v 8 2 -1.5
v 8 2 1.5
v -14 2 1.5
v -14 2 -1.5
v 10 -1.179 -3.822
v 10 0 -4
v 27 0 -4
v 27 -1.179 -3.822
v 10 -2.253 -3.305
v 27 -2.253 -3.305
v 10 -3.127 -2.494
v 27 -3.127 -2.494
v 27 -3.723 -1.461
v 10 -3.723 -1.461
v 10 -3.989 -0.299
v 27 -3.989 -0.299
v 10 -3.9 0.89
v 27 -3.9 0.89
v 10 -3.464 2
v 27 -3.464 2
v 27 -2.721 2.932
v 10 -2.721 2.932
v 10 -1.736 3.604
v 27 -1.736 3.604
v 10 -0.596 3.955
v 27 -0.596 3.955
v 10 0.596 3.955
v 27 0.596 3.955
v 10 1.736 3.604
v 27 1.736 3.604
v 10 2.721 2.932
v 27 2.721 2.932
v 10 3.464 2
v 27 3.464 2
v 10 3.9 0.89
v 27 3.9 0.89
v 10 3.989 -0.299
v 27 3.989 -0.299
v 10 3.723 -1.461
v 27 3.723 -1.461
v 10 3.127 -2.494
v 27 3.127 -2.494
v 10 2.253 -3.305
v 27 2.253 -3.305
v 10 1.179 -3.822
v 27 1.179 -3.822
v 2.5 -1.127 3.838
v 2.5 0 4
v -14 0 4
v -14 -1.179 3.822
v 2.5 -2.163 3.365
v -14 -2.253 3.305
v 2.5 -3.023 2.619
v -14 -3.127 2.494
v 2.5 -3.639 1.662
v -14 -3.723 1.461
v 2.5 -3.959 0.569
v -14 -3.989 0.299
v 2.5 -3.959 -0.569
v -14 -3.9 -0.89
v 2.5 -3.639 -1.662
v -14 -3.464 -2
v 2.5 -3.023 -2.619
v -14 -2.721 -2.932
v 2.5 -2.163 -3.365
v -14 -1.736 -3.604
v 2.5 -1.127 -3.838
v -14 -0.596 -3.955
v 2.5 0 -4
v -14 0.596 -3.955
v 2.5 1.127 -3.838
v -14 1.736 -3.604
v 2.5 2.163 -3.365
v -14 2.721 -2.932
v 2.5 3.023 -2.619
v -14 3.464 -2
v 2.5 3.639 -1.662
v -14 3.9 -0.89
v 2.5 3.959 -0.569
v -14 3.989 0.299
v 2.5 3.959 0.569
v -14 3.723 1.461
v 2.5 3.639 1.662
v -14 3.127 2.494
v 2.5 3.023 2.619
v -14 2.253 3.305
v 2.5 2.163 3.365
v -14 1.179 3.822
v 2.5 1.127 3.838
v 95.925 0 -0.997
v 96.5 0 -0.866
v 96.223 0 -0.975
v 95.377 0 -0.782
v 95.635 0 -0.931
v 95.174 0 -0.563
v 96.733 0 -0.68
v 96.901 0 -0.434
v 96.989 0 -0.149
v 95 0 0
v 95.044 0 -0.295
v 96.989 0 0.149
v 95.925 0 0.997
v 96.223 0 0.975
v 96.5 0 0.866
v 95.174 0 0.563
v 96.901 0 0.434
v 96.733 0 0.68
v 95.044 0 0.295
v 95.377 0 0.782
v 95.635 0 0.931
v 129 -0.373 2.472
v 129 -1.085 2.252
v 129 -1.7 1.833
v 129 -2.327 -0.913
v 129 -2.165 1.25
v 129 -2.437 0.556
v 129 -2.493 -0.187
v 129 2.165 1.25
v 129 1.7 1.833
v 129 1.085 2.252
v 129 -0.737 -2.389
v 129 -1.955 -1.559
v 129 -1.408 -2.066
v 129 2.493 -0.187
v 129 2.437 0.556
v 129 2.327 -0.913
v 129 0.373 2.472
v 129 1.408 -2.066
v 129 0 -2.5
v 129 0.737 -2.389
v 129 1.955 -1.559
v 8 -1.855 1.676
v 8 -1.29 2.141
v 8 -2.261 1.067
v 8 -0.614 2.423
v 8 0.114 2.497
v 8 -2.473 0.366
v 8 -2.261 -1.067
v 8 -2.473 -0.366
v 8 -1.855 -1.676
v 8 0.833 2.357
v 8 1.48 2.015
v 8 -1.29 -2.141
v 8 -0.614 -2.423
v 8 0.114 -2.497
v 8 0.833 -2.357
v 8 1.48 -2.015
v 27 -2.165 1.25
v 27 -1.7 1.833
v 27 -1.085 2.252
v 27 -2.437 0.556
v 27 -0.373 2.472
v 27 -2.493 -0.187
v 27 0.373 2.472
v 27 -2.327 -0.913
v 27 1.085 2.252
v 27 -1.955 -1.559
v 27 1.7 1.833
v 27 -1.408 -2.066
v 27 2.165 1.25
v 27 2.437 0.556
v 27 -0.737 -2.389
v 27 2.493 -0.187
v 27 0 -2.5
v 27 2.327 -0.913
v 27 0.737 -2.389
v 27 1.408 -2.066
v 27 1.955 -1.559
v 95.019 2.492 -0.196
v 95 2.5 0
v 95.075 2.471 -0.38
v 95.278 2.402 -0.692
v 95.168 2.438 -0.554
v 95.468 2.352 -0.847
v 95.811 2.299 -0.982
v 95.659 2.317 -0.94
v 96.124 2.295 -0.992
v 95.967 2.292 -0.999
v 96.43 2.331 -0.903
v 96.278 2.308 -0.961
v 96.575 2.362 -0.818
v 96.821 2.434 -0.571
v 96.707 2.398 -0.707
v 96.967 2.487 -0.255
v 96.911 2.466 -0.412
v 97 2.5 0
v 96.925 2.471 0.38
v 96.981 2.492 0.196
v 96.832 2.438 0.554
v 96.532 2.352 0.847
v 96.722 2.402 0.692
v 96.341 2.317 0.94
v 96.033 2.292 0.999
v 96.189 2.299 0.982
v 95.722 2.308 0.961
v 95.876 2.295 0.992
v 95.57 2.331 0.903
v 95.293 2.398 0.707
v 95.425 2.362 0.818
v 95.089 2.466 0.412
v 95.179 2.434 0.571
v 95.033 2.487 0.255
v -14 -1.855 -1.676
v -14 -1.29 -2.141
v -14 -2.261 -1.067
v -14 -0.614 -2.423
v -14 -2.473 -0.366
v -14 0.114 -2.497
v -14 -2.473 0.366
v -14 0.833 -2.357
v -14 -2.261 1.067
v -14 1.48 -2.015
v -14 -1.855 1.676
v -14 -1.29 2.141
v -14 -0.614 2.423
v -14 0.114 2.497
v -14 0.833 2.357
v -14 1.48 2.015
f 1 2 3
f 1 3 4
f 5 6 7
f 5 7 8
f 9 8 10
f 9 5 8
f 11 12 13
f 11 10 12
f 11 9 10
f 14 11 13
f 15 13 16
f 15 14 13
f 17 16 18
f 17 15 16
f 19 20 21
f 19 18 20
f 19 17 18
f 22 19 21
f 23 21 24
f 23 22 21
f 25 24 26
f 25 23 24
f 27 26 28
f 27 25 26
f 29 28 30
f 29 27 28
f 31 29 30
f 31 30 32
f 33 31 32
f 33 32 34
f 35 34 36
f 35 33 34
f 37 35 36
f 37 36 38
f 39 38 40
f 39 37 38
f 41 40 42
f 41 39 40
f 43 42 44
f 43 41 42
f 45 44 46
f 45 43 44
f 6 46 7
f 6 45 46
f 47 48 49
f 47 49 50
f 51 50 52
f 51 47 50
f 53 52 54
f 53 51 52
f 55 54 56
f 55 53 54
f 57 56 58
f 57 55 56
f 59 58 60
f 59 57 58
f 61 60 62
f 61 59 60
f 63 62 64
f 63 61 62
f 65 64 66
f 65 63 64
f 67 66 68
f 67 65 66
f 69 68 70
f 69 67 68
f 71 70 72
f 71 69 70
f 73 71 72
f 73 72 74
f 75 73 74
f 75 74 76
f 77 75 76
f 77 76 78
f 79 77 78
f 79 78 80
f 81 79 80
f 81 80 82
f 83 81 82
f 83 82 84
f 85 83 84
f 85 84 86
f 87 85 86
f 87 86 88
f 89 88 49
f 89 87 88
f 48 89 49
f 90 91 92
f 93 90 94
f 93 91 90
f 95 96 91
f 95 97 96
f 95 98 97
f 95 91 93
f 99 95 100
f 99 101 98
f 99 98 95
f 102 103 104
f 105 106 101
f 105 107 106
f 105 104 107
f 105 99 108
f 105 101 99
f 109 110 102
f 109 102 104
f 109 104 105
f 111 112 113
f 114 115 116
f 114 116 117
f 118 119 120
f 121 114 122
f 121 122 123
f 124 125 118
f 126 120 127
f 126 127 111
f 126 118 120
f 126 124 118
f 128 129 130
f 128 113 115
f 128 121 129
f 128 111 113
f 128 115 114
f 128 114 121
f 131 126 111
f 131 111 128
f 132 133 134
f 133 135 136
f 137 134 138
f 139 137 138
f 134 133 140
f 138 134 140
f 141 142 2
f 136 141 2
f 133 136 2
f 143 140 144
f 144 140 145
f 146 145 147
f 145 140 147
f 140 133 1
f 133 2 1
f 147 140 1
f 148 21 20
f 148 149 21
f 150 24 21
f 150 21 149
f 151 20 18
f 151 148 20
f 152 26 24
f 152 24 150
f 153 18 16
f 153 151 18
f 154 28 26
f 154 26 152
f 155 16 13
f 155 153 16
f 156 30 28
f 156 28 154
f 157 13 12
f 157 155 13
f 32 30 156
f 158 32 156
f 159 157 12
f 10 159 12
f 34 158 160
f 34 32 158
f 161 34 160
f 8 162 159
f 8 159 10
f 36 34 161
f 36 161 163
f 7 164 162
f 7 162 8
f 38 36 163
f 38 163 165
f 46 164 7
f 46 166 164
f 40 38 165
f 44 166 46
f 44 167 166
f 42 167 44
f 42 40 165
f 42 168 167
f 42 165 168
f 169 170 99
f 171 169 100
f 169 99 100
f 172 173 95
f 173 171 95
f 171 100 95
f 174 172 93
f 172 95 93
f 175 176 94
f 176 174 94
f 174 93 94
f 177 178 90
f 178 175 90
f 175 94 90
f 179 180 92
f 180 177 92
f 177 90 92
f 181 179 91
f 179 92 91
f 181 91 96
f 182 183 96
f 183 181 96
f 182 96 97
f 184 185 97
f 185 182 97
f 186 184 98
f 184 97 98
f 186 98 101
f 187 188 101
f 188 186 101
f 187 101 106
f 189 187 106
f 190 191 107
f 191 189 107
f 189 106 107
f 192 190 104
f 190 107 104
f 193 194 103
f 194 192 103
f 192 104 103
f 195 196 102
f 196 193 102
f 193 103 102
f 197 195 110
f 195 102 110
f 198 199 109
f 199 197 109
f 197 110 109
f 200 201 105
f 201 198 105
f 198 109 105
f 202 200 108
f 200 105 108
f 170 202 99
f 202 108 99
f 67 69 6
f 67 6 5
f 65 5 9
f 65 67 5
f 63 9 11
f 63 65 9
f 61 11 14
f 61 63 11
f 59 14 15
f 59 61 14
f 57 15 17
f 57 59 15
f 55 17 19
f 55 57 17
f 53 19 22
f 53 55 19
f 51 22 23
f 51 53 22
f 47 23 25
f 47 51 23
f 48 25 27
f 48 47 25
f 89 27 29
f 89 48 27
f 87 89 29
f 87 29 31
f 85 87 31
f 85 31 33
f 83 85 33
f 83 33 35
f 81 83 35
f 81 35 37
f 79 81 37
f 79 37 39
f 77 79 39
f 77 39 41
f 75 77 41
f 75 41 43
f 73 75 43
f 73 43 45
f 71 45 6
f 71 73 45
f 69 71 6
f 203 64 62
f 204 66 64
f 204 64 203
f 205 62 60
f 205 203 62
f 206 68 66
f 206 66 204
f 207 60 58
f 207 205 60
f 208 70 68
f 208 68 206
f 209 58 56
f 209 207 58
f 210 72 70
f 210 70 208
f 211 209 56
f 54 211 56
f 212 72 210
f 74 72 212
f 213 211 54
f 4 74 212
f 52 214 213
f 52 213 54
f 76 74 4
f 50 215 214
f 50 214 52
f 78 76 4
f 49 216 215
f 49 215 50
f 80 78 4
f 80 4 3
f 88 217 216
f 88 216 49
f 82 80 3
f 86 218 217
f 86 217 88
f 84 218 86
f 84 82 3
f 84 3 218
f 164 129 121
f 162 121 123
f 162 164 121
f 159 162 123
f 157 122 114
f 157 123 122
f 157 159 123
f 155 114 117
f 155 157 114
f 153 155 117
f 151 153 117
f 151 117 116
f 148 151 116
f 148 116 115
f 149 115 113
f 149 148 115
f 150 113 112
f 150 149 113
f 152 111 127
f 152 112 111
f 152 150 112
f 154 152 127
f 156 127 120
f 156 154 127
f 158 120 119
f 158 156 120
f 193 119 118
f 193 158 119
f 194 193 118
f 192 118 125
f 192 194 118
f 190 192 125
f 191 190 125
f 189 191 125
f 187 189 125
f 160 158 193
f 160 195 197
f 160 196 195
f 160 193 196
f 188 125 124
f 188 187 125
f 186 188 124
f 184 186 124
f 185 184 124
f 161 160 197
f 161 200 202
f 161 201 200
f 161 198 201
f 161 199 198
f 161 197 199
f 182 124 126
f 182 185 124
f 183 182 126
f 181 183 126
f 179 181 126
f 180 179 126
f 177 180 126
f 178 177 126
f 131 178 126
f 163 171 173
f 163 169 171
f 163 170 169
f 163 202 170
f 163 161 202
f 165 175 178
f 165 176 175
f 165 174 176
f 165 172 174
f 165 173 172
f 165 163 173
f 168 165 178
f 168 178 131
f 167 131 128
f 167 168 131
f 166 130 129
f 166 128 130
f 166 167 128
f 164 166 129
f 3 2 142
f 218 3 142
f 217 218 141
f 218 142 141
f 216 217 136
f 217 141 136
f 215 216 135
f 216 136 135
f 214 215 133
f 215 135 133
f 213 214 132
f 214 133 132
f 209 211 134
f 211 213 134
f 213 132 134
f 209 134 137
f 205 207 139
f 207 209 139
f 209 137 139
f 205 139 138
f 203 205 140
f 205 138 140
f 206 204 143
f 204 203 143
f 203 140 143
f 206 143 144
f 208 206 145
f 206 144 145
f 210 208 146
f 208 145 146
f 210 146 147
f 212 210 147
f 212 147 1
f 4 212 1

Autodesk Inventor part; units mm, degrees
ref_plane "YZ Plane" through (0, 0, 0) normal (1, 0, 0) x (0, 1, 0)
ref_plane "XZ Plane" through (0, 0, 0) normal (0, 1, 0) x (-1, 0, 0)
ref_plane "XY Plane" through (0, 0, 0) normal (0, 0, 1) x (1, 0, 0)
sketch "Sketch1" plane through (0, 0, 0) normal (1, 0, 0) x (0, 1, 0)
  circle A0 centre (0, 0) radius 4
  circle A1 centre (0, 0) radius 2.5
  line L0 (2, 0) -> (2, -1.5)
  line L1 (2, 0) -> (2, 1.5)
  dimension "d0" = 8
  dimension "d1" = 5
extrude "Extrusion1" add sketch "Sketch1" along normal blind 8 contours A0 | A1 L0 L1 picked at (2.0912, -0.8466)
sketch "Sketch2" plane through (8, 0, 0) normal (1, 0, 0) x (0, 0, -1)
  circle A0 centre (0, 0) radius 4
  circle A1 centre (0, 0) radius 2.5
extrude "Extrusion2" add sketch "Sketch2" along normal blind 2
sketch "Sketch3" plane through (8, 0, 0) normal (1, 0, 0) x (0, 0, -1)
  circle A0 centre (0, 0) radius 2.5
extrude "Extrusion3" add sketch "Sketch3" along normal blind 151
sketch "Sketch4" plane through (0, 0, 0) normal (-1, 0, 0) x (0, 0, 1)
  circle A0 centre (0, 0) radius 4
extrude "Extrusion4" cut sketch "Sketch4" against normal blind 2.5
sketch "Sketch6" plane through (0, 0, 0) normal (0, 1, 0) x (-1, 0, 0)
  line L0 (-159, 2.5) -> (-159, -2.5) projected
  line L1 (-159, 0) -> (-96, 0)
  circle A0 centre (-96, 0) radius 1
  point P0 (0, 0)
  dimension "d17" = 63
  dimension "d18" = 2
extrude "Extrusion6" cut sketch "Sketch6" along normal blind 10
thread "Thread2" size "M2x0.4" class "6H" standard "ANSI Metric M Profile" full length
sketch "Sketch7" plane through (2.5, 0, 0) normal (-1, 0, 0) x (0, 0, 1)
  circle A0 centre (0, 0) radius 2.5
  circle A1 centre (0, 0) radius 4
  line L0 (1.5, 2) -> (-1.5, 2) projected
  line L1 (0, 2) -> (1.5, 2)
  line L2 (0, 2) -> (-1.5, 2)
extrude "Extrusion7" add sketch "Sketch7" along normal blind 16.5
sketch "Sketch8" plane through (2.5, 0, 0) normal (-1, 0, 0) x (0, 0, 1)
  circle A0 centre (0, 0) radius 2.5
  line L0 (1.5, 2) -> (-1.5, 2) projected
  line L1 (1.5, 2) -> (-1.5, 2)
extrude "Extrusion8" add sketch "Sketch8" along normal blind 16.5 contours L0 A0 picked at (-0.3466, 2.0912)
sketch "Sketch10" plane through (10, 0, 0) normal (1, 0, 0) x (0, 0, -1)
  circle A0 centre (0, 0) radius 2.5
  circle A1 centre (0, 0) radius 4
extrude "Extrusion9" add sketch "Sketch10" along normal blind 17
sketch "Sketch11" plane through (159, 0, 0) normal (1, 0, 0) x (0, 0, -1)
  circle A0 centre (0, 0) radius 2.5
extrude "Extrusion10" cut sketch "Sketch11" against normal blind 30
properties part number "wormgear_axis_6mm" material "Stainless Steel"
